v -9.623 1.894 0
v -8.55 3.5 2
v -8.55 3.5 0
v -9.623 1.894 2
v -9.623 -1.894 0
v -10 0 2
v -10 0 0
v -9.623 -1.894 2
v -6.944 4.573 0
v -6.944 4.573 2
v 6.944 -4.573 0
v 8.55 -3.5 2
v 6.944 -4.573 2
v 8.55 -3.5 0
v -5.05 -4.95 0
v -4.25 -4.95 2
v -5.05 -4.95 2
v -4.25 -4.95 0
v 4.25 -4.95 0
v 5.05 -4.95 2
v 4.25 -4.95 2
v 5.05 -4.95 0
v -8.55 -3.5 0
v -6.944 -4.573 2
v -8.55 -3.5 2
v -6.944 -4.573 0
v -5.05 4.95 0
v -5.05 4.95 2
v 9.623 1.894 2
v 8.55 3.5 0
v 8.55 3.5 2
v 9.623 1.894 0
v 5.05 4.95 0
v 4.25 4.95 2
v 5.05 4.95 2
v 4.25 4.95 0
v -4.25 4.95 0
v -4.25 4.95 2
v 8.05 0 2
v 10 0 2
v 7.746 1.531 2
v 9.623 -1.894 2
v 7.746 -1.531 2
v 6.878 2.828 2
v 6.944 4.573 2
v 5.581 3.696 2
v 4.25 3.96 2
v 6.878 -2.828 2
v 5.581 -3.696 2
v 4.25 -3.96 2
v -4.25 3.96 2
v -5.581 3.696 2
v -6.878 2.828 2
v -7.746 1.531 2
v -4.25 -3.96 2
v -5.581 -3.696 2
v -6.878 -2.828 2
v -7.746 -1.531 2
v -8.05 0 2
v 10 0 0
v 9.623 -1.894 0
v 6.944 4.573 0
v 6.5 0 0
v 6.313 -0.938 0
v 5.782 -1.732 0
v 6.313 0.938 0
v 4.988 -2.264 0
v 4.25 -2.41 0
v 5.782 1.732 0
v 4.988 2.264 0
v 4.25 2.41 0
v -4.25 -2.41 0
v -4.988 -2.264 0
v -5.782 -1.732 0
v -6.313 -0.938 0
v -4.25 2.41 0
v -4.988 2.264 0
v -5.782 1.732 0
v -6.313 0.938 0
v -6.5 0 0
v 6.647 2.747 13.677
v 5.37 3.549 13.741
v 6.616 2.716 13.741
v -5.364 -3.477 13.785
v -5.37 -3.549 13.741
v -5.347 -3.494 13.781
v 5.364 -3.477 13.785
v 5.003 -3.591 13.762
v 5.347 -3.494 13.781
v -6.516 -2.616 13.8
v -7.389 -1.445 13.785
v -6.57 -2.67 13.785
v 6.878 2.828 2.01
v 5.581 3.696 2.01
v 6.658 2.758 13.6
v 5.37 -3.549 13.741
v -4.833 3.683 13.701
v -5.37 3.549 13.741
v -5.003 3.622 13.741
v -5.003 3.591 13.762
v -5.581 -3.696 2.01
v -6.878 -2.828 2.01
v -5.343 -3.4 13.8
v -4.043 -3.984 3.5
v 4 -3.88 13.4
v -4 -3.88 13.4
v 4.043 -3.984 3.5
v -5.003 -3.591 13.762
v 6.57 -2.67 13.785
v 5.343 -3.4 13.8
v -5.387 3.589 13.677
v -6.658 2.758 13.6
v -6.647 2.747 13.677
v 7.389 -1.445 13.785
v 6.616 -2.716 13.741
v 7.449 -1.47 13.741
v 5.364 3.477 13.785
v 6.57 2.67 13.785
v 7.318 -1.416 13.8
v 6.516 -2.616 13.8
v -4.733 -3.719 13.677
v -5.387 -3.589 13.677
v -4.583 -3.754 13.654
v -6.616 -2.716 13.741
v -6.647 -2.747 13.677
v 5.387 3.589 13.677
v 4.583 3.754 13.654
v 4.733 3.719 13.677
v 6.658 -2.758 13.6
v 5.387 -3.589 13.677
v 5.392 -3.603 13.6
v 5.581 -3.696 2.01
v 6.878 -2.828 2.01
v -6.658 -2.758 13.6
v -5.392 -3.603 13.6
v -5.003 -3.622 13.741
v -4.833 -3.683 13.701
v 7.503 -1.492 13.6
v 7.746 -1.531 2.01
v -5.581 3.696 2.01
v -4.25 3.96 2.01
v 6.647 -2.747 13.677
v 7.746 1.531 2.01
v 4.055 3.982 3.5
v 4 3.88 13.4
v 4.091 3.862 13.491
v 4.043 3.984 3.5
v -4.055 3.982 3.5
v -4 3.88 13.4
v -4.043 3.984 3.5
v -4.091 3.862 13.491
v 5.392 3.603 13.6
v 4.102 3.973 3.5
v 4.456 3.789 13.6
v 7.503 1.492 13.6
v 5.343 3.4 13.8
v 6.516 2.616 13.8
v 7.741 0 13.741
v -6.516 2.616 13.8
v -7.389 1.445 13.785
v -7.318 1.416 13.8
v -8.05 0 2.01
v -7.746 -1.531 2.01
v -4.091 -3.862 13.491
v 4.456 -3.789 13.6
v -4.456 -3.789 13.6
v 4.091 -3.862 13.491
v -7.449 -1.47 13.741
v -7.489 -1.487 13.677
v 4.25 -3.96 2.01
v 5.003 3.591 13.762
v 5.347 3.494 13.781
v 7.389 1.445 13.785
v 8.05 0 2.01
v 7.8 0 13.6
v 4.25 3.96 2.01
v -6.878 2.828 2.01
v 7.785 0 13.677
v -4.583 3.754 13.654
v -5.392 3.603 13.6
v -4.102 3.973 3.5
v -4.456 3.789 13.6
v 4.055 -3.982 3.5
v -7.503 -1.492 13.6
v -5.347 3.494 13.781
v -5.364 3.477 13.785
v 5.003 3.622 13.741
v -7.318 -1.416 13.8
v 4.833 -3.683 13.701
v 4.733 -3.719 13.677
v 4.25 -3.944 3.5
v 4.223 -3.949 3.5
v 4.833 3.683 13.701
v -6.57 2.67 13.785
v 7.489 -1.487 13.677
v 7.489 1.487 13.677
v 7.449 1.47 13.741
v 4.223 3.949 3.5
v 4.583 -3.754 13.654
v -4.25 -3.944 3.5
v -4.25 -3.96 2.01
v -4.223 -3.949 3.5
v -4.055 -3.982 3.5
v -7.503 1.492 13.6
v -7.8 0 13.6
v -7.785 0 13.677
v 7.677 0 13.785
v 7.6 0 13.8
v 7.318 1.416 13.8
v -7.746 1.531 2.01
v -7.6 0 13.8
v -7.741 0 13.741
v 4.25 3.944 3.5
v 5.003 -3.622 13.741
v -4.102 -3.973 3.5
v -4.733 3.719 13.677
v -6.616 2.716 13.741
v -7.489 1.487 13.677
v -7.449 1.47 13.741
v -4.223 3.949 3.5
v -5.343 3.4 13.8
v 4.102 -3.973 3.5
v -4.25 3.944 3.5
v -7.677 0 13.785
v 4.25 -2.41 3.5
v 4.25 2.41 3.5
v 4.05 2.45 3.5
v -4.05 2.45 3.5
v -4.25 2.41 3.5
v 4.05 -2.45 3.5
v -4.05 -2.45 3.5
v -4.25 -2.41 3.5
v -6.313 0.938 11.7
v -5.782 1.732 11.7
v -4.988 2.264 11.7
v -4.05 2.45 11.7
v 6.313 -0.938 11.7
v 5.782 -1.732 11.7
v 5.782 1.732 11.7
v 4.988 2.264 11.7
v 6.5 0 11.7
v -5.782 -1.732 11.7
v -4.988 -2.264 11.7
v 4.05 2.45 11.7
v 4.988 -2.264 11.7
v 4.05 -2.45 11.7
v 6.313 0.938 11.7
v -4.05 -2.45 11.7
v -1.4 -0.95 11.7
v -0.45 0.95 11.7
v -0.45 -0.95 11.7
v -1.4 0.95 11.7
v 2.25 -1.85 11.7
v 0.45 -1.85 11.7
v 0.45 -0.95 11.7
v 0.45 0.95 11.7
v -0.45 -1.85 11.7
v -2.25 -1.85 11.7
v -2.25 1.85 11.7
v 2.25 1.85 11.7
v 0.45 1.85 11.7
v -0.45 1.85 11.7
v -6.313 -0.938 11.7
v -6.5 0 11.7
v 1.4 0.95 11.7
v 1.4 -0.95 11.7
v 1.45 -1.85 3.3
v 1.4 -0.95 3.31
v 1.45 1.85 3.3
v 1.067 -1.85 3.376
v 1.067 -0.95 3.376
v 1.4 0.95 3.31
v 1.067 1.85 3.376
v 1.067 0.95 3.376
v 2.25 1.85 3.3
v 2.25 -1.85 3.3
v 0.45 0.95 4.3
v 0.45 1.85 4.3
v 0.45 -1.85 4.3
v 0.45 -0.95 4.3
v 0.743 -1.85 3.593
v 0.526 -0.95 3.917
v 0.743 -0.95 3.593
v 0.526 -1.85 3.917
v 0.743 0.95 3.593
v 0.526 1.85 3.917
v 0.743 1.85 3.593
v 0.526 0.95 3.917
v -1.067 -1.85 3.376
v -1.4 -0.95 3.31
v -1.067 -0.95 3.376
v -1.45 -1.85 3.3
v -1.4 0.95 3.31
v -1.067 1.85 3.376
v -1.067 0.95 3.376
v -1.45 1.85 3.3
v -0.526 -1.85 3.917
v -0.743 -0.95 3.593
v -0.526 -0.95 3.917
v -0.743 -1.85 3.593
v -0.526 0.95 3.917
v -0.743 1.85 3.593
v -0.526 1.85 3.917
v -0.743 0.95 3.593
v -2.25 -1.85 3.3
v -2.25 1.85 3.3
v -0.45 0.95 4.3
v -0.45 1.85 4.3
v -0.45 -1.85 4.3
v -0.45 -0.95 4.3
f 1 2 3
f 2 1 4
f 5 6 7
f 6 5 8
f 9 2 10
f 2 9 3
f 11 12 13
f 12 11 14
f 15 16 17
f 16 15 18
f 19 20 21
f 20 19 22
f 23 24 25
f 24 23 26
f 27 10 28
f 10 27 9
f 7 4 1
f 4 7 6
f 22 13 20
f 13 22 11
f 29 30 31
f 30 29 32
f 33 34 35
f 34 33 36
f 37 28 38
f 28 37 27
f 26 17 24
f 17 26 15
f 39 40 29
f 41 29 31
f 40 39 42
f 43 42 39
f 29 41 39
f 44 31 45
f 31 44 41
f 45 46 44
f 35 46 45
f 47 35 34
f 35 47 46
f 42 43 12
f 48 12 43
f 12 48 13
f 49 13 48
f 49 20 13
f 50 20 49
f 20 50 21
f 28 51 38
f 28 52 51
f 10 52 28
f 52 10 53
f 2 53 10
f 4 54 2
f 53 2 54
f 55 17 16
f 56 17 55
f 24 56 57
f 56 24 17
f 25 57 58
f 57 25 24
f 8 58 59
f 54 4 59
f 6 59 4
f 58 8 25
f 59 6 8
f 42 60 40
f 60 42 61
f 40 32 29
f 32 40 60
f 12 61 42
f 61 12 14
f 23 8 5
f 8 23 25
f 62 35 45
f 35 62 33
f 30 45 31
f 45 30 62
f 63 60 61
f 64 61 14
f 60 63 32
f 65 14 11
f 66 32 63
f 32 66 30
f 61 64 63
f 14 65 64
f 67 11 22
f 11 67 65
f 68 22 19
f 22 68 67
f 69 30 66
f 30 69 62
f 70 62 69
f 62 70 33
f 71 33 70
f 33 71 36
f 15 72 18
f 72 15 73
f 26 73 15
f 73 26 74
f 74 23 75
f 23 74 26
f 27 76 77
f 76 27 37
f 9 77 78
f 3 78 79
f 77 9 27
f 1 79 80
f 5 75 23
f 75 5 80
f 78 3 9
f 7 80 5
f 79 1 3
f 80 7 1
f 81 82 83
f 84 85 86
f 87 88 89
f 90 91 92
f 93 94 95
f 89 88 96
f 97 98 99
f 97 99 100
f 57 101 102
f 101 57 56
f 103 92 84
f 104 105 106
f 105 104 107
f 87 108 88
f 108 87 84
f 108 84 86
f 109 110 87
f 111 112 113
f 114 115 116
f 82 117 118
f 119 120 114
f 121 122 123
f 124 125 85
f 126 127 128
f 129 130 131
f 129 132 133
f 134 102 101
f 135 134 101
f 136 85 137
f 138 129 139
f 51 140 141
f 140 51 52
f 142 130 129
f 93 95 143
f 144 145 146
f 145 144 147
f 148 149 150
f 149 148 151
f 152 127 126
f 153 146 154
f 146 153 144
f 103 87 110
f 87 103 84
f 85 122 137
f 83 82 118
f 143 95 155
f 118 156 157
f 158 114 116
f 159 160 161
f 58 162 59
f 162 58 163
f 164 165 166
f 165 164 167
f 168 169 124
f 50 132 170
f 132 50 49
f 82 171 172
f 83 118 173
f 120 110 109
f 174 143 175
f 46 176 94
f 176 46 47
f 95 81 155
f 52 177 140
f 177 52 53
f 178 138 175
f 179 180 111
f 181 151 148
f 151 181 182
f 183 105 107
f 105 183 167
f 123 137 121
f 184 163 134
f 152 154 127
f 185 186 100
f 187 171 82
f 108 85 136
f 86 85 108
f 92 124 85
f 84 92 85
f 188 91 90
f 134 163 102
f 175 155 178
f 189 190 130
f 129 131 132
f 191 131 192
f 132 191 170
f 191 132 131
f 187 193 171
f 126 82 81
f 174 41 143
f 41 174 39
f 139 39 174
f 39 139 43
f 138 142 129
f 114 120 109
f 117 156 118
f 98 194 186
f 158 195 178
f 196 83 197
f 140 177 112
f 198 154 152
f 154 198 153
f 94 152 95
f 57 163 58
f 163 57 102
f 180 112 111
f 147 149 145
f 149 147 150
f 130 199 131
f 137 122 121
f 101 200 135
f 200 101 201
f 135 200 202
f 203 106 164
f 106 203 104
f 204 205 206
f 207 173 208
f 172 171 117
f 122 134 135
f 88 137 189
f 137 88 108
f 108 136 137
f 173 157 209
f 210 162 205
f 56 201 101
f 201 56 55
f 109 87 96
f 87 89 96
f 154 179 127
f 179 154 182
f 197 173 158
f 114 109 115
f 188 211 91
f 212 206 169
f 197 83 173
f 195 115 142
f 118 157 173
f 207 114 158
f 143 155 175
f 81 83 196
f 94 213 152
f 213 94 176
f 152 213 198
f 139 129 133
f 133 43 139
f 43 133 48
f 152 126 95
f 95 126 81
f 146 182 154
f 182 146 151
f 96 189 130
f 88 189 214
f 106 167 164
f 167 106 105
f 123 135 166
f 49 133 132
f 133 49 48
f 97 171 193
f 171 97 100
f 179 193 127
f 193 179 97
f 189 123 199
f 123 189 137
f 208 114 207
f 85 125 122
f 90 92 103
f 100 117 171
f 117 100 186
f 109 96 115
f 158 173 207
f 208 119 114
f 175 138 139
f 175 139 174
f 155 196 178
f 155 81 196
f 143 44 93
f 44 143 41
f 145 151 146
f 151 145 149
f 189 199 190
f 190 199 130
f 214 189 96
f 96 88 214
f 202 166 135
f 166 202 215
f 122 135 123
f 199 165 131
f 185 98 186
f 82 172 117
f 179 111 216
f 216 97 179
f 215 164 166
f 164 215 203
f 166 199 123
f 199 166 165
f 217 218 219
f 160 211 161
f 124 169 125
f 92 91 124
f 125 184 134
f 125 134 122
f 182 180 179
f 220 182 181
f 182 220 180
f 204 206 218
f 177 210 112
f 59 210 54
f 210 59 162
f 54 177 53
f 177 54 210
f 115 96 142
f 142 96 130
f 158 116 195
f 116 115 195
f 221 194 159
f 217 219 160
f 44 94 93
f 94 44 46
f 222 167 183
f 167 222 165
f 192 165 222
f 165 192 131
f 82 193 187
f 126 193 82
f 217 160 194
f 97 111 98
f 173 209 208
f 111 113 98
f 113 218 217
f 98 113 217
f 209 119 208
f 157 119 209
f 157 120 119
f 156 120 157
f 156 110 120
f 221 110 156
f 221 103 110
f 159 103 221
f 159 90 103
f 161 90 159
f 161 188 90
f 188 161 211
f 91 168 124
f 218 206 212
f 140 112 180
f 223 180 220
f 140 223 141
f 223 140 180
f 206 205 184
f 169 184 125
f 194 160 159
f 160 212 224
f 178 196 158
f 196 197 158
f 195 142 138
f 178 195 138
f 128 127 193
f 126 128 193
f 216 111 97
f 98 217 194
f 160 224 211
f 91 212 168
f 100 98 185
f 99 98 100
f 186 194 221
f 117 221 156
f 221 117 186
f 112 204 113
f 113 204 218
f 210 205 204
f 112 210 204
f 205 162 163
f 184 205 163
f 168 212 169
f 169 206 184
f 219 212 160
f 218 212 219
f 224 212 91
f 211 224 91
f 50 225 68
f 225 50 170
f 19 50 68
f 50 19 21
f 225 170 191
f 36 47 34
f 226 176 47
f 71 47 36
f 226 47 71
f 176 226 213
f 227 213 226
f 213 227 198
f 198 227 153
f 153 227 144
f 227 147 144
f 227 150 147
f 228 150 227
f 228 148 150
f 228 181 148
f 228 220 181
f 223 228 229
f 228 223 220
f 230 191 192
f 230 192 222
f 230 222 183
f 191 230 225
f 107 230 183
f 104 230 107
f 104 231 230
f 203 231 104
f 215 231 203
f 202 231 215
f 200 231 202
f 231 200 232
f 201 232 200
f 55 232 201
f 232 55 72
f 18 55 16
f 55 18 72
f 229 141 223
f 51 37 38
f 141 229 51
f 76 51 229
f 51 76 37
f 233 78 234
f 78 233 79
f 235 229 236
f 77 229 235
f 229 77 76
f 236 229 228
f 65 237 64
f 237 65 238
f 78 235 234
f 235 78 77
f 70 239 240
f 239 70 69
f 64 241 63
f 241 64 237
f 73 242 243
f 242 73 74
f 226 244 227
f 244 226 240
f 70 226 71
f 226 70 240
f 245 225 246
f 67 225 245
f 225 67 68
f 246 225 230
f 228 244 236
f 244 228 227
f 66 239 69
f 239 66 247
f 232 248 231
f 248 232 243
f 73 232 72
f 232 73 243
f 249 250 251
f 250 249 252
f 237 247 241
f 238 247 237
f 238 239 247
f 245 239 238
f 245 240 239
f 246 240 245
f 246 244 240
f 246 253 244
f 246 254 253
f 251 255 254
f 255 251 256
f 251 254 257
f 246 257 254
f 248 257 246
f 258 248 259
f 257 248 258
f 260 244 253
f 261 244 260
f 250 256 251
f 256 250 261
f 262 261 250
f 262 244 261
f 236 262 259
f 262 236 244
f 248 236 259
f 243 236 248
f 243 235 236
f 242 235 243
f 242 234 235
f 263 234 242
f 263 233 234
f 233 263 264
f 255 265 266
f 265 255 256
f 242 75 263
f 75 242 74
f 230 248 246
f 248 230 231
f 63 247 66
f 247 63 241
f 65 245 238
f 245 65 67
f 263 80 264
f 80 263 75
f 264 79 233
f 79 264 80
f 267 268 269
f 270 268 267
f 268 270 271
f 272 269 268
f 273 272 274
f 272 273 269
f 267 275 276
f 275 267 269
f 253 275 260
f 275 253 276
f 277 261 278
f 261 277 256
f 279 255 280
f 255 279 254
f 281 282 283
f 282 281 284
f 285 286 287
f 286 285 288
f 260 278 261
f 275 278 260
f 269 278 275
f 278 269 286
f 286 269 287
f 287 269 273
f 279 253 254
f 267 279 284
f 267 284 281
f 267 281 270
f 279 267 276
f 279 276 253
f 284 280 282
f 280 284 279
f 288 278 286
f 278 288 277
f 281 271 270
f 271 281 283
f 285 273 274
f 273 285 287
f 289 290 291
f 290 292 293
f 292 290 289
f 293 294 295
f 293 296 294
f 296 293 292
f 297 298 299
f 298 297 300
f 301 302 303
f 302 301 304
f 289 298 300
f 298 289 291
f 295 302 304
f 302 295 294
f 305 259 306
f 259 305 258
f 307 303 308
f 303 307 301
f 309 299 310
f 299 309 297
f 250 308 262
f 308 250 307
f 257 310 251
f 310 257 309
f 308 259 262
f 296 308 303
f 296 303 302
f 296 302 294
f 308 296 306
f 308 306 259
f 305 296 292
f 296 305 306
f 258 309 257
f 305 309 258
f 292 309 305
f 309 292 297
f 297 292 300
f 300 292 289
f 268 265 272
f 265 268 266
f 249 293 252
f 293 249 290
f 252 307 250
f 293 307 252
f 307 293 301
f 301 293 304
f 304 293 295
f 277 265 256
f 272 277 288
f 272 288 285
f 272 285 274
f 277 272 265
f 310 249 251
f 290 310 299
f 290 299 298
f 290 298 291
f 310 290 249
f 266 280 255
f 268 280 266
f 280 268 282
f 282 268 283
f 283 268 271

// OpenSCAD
/*
 * Turbo button (A and B) for the NES four score
 */

$fn = 16;


/*
 * Flat pill-shape with rounded top edge
 */
module pill_fillet_end(diameter, height, rounding) {
  r = diameter/2;
  cx = r - rounding;
  cy = height - rounding;


  rotate([0, 0, -90]) {
    rotate_extrude(angle=180) {

      // Rectangle with a single rounded corner
      square(size=[r, cy]);

      if (rounding > 0) {
        square(size=[cx, height]);
        translate([cx, cy, 0])
          rotate([0,0,45])
            circle(r=rounding);
      }
    };
  };
}


module flat_rounded_pill(length, diameter, height, rounding=0) {
  // Distance from the middle to the center of the round cap
  mid = (length/2) - (diameter/2);
  hull() {
    translate([mid,0,0])
      pill_fillet_end(diameter, height, rounding);
    translate([-mid,0,0])
      rotate([0,0,180])
      pill_fillet_end(diameter, height, rounding);
  }
}

module pill_2d(length, diameter) {
  mid = (length/2) - (diameter/2);

  translate([mid,0,0])
    circle(d=diameter);
  translate([-mid,0,0])
    circle(d=diameter);
  square([2*mid, diameter], center=true);

}



/*
 * Brim
 */

tb_brim_length=20;
tb_brim_diameter=9.9;
tb_brim_height=2;


module tb_brim() {

  linear_extrude(tb_brim_height) {
    pill_2d(tb_brim_length, tb_brim_diameter);
  }
}



/*
 * Steeple
 */

tb_steeple_bot_length=16.1;
tb_steeple_bot_diameter=8;
tb_steeple_height=11.4;

tb_steeple_top_length=15.6;
tb_steeple_top_diameter=7.8;
tb_steeple_narrow_rounding=0.2;
tb_steeple_wide_rounding=0.5;

module tb_steeple_rounding() {
  top_rect_x = tb_steeple_top_length - (tb_steeple_top_diameter);
  top_rect_y = tb_steeple_top_diameter - (tb_steeple_wide_rounding*2);

  // Cut off a wider fillet along the X axis
  translate([0, 0, -tb_steeple_wide_rounding])
  rotate([0,90,0]) {
    translate([0,top_rect_y/2, 0])
      cylinder(h=tb_steeple_top_length, r=tb_steeple_wide_rounding, center=true);
    translate([0,-top_rect_y/2, 0])
      cylinder(h=tb_steeple_top_length, r=tb_steeple_wide_rounding, center=true);

    translate([-tb_steeple_wide_rounding/2, 0, 0])
    cube([tb_steeple_wide_rounding, top_rect_y, tb_steeple_top_length], center=true);
  }
}

module tb_steeple() {


    hull() {
      // Bottom of steeple
      flat_rounded_pill(tb_steeple_bot_length, tb_steeple_bot_diameter, 0.01);

      // Top of steeple has two different fillets.
      // A narrow one around the ends and a wide one on the straight edges.
      translate([0, 0, tb_steeple_height])
        intersection() {
          // Base extent of the top surface, with narrow rounding all around
          flat_rounded_pill(tb_steeple_top_length, tb_steeple_top_diameter, tb_steeple_narrow_rounding*2, tb_steeple_narrow_rounding);

          // Wider rounding along the X axis
          translate([0, 0, tb_steeple_narrow_rounding*2])
          tb_steeple_rounding();
        }
    }



}

// The solid body
module tb_body() {
  tb_brim();
  translate([0,0,tb_brim_height])
    tb_steeple();
}



/*
 * Holes and cutouts
 */

tb_cutout_width=8.5;
tb_cutout_height = 3.5;

tb_hole_depth = 11.7;
tb_hole_length = 13;
tb_hole_diameter = 4.9;

module tb_holes() {
  // Cutout through the base
  translate([0, 0, tb_cutout_height/2])
    cube([tb_cutout_width, tb_brim_diameter+0.1, tb_cutout_height], center=true);

  // Hole up through the body
  linear_extrude(tb_hole_depth)
    pill_2d(tb_hole_length, tb_hole_diameter);
}



/*
 * The grips inside the hole
 */

tb_grip_b2b = 4.5;
tb_grip_width = 3.7;
tb_grip_thickness = 0.8;
tb_grip_spacing = 0.9;
tb_grip_rounding = tb_grip_b2b/2 - (tb_grip_thickness) - (tb_grip_spacing/2);

tb_grip_gap_width = 2.8;
tb_grip_gap_depth = 1.9;

tb_grip_extent=8.4;


module tb_grip() {
  w = (tb_grip_b2b/2) - (tb_grip_spacing/2);
  rx = w-tb_grip_rounding;
  ry = tb_grip_extent-tb_grip_rounding;

  rotate([-90, 0, 0])
  linear_extrude(tb_grip_width, center=true)
    // Cross-section of one gripper, seen from front
    translate([tb_grip_b2b / 2, 0, 0 ]) {
      rotate([0, 180, 0]) {
        square([rx, tb_grip_extent]);
        square([w, ry]);
        translate([rx, ry])
          intersection() {
            square(tb_grip_rounding);
            circle(r=tb_grip_rounding);
          }
      }
    }

}

module tb_grips() {
  difference() {
    union() {
      tb_grip();
      mirror([1,0,0])
        tb_grip();
    }

    // The hole between the prongs
    translate([0,0, -tb_grip_extent/2])
      cube([tb_grip_gap_width, tb_grip_gap_depth, tb_grip_extent], center=true);
  }
}




/*
 * Top-level module 
 */
module turbo_button() {
  difference() {
    tb_body();
    tb_holes();
  }

  translate([0,0,tb_hole_depth])
    tb_grips();
}



turbo_button();
